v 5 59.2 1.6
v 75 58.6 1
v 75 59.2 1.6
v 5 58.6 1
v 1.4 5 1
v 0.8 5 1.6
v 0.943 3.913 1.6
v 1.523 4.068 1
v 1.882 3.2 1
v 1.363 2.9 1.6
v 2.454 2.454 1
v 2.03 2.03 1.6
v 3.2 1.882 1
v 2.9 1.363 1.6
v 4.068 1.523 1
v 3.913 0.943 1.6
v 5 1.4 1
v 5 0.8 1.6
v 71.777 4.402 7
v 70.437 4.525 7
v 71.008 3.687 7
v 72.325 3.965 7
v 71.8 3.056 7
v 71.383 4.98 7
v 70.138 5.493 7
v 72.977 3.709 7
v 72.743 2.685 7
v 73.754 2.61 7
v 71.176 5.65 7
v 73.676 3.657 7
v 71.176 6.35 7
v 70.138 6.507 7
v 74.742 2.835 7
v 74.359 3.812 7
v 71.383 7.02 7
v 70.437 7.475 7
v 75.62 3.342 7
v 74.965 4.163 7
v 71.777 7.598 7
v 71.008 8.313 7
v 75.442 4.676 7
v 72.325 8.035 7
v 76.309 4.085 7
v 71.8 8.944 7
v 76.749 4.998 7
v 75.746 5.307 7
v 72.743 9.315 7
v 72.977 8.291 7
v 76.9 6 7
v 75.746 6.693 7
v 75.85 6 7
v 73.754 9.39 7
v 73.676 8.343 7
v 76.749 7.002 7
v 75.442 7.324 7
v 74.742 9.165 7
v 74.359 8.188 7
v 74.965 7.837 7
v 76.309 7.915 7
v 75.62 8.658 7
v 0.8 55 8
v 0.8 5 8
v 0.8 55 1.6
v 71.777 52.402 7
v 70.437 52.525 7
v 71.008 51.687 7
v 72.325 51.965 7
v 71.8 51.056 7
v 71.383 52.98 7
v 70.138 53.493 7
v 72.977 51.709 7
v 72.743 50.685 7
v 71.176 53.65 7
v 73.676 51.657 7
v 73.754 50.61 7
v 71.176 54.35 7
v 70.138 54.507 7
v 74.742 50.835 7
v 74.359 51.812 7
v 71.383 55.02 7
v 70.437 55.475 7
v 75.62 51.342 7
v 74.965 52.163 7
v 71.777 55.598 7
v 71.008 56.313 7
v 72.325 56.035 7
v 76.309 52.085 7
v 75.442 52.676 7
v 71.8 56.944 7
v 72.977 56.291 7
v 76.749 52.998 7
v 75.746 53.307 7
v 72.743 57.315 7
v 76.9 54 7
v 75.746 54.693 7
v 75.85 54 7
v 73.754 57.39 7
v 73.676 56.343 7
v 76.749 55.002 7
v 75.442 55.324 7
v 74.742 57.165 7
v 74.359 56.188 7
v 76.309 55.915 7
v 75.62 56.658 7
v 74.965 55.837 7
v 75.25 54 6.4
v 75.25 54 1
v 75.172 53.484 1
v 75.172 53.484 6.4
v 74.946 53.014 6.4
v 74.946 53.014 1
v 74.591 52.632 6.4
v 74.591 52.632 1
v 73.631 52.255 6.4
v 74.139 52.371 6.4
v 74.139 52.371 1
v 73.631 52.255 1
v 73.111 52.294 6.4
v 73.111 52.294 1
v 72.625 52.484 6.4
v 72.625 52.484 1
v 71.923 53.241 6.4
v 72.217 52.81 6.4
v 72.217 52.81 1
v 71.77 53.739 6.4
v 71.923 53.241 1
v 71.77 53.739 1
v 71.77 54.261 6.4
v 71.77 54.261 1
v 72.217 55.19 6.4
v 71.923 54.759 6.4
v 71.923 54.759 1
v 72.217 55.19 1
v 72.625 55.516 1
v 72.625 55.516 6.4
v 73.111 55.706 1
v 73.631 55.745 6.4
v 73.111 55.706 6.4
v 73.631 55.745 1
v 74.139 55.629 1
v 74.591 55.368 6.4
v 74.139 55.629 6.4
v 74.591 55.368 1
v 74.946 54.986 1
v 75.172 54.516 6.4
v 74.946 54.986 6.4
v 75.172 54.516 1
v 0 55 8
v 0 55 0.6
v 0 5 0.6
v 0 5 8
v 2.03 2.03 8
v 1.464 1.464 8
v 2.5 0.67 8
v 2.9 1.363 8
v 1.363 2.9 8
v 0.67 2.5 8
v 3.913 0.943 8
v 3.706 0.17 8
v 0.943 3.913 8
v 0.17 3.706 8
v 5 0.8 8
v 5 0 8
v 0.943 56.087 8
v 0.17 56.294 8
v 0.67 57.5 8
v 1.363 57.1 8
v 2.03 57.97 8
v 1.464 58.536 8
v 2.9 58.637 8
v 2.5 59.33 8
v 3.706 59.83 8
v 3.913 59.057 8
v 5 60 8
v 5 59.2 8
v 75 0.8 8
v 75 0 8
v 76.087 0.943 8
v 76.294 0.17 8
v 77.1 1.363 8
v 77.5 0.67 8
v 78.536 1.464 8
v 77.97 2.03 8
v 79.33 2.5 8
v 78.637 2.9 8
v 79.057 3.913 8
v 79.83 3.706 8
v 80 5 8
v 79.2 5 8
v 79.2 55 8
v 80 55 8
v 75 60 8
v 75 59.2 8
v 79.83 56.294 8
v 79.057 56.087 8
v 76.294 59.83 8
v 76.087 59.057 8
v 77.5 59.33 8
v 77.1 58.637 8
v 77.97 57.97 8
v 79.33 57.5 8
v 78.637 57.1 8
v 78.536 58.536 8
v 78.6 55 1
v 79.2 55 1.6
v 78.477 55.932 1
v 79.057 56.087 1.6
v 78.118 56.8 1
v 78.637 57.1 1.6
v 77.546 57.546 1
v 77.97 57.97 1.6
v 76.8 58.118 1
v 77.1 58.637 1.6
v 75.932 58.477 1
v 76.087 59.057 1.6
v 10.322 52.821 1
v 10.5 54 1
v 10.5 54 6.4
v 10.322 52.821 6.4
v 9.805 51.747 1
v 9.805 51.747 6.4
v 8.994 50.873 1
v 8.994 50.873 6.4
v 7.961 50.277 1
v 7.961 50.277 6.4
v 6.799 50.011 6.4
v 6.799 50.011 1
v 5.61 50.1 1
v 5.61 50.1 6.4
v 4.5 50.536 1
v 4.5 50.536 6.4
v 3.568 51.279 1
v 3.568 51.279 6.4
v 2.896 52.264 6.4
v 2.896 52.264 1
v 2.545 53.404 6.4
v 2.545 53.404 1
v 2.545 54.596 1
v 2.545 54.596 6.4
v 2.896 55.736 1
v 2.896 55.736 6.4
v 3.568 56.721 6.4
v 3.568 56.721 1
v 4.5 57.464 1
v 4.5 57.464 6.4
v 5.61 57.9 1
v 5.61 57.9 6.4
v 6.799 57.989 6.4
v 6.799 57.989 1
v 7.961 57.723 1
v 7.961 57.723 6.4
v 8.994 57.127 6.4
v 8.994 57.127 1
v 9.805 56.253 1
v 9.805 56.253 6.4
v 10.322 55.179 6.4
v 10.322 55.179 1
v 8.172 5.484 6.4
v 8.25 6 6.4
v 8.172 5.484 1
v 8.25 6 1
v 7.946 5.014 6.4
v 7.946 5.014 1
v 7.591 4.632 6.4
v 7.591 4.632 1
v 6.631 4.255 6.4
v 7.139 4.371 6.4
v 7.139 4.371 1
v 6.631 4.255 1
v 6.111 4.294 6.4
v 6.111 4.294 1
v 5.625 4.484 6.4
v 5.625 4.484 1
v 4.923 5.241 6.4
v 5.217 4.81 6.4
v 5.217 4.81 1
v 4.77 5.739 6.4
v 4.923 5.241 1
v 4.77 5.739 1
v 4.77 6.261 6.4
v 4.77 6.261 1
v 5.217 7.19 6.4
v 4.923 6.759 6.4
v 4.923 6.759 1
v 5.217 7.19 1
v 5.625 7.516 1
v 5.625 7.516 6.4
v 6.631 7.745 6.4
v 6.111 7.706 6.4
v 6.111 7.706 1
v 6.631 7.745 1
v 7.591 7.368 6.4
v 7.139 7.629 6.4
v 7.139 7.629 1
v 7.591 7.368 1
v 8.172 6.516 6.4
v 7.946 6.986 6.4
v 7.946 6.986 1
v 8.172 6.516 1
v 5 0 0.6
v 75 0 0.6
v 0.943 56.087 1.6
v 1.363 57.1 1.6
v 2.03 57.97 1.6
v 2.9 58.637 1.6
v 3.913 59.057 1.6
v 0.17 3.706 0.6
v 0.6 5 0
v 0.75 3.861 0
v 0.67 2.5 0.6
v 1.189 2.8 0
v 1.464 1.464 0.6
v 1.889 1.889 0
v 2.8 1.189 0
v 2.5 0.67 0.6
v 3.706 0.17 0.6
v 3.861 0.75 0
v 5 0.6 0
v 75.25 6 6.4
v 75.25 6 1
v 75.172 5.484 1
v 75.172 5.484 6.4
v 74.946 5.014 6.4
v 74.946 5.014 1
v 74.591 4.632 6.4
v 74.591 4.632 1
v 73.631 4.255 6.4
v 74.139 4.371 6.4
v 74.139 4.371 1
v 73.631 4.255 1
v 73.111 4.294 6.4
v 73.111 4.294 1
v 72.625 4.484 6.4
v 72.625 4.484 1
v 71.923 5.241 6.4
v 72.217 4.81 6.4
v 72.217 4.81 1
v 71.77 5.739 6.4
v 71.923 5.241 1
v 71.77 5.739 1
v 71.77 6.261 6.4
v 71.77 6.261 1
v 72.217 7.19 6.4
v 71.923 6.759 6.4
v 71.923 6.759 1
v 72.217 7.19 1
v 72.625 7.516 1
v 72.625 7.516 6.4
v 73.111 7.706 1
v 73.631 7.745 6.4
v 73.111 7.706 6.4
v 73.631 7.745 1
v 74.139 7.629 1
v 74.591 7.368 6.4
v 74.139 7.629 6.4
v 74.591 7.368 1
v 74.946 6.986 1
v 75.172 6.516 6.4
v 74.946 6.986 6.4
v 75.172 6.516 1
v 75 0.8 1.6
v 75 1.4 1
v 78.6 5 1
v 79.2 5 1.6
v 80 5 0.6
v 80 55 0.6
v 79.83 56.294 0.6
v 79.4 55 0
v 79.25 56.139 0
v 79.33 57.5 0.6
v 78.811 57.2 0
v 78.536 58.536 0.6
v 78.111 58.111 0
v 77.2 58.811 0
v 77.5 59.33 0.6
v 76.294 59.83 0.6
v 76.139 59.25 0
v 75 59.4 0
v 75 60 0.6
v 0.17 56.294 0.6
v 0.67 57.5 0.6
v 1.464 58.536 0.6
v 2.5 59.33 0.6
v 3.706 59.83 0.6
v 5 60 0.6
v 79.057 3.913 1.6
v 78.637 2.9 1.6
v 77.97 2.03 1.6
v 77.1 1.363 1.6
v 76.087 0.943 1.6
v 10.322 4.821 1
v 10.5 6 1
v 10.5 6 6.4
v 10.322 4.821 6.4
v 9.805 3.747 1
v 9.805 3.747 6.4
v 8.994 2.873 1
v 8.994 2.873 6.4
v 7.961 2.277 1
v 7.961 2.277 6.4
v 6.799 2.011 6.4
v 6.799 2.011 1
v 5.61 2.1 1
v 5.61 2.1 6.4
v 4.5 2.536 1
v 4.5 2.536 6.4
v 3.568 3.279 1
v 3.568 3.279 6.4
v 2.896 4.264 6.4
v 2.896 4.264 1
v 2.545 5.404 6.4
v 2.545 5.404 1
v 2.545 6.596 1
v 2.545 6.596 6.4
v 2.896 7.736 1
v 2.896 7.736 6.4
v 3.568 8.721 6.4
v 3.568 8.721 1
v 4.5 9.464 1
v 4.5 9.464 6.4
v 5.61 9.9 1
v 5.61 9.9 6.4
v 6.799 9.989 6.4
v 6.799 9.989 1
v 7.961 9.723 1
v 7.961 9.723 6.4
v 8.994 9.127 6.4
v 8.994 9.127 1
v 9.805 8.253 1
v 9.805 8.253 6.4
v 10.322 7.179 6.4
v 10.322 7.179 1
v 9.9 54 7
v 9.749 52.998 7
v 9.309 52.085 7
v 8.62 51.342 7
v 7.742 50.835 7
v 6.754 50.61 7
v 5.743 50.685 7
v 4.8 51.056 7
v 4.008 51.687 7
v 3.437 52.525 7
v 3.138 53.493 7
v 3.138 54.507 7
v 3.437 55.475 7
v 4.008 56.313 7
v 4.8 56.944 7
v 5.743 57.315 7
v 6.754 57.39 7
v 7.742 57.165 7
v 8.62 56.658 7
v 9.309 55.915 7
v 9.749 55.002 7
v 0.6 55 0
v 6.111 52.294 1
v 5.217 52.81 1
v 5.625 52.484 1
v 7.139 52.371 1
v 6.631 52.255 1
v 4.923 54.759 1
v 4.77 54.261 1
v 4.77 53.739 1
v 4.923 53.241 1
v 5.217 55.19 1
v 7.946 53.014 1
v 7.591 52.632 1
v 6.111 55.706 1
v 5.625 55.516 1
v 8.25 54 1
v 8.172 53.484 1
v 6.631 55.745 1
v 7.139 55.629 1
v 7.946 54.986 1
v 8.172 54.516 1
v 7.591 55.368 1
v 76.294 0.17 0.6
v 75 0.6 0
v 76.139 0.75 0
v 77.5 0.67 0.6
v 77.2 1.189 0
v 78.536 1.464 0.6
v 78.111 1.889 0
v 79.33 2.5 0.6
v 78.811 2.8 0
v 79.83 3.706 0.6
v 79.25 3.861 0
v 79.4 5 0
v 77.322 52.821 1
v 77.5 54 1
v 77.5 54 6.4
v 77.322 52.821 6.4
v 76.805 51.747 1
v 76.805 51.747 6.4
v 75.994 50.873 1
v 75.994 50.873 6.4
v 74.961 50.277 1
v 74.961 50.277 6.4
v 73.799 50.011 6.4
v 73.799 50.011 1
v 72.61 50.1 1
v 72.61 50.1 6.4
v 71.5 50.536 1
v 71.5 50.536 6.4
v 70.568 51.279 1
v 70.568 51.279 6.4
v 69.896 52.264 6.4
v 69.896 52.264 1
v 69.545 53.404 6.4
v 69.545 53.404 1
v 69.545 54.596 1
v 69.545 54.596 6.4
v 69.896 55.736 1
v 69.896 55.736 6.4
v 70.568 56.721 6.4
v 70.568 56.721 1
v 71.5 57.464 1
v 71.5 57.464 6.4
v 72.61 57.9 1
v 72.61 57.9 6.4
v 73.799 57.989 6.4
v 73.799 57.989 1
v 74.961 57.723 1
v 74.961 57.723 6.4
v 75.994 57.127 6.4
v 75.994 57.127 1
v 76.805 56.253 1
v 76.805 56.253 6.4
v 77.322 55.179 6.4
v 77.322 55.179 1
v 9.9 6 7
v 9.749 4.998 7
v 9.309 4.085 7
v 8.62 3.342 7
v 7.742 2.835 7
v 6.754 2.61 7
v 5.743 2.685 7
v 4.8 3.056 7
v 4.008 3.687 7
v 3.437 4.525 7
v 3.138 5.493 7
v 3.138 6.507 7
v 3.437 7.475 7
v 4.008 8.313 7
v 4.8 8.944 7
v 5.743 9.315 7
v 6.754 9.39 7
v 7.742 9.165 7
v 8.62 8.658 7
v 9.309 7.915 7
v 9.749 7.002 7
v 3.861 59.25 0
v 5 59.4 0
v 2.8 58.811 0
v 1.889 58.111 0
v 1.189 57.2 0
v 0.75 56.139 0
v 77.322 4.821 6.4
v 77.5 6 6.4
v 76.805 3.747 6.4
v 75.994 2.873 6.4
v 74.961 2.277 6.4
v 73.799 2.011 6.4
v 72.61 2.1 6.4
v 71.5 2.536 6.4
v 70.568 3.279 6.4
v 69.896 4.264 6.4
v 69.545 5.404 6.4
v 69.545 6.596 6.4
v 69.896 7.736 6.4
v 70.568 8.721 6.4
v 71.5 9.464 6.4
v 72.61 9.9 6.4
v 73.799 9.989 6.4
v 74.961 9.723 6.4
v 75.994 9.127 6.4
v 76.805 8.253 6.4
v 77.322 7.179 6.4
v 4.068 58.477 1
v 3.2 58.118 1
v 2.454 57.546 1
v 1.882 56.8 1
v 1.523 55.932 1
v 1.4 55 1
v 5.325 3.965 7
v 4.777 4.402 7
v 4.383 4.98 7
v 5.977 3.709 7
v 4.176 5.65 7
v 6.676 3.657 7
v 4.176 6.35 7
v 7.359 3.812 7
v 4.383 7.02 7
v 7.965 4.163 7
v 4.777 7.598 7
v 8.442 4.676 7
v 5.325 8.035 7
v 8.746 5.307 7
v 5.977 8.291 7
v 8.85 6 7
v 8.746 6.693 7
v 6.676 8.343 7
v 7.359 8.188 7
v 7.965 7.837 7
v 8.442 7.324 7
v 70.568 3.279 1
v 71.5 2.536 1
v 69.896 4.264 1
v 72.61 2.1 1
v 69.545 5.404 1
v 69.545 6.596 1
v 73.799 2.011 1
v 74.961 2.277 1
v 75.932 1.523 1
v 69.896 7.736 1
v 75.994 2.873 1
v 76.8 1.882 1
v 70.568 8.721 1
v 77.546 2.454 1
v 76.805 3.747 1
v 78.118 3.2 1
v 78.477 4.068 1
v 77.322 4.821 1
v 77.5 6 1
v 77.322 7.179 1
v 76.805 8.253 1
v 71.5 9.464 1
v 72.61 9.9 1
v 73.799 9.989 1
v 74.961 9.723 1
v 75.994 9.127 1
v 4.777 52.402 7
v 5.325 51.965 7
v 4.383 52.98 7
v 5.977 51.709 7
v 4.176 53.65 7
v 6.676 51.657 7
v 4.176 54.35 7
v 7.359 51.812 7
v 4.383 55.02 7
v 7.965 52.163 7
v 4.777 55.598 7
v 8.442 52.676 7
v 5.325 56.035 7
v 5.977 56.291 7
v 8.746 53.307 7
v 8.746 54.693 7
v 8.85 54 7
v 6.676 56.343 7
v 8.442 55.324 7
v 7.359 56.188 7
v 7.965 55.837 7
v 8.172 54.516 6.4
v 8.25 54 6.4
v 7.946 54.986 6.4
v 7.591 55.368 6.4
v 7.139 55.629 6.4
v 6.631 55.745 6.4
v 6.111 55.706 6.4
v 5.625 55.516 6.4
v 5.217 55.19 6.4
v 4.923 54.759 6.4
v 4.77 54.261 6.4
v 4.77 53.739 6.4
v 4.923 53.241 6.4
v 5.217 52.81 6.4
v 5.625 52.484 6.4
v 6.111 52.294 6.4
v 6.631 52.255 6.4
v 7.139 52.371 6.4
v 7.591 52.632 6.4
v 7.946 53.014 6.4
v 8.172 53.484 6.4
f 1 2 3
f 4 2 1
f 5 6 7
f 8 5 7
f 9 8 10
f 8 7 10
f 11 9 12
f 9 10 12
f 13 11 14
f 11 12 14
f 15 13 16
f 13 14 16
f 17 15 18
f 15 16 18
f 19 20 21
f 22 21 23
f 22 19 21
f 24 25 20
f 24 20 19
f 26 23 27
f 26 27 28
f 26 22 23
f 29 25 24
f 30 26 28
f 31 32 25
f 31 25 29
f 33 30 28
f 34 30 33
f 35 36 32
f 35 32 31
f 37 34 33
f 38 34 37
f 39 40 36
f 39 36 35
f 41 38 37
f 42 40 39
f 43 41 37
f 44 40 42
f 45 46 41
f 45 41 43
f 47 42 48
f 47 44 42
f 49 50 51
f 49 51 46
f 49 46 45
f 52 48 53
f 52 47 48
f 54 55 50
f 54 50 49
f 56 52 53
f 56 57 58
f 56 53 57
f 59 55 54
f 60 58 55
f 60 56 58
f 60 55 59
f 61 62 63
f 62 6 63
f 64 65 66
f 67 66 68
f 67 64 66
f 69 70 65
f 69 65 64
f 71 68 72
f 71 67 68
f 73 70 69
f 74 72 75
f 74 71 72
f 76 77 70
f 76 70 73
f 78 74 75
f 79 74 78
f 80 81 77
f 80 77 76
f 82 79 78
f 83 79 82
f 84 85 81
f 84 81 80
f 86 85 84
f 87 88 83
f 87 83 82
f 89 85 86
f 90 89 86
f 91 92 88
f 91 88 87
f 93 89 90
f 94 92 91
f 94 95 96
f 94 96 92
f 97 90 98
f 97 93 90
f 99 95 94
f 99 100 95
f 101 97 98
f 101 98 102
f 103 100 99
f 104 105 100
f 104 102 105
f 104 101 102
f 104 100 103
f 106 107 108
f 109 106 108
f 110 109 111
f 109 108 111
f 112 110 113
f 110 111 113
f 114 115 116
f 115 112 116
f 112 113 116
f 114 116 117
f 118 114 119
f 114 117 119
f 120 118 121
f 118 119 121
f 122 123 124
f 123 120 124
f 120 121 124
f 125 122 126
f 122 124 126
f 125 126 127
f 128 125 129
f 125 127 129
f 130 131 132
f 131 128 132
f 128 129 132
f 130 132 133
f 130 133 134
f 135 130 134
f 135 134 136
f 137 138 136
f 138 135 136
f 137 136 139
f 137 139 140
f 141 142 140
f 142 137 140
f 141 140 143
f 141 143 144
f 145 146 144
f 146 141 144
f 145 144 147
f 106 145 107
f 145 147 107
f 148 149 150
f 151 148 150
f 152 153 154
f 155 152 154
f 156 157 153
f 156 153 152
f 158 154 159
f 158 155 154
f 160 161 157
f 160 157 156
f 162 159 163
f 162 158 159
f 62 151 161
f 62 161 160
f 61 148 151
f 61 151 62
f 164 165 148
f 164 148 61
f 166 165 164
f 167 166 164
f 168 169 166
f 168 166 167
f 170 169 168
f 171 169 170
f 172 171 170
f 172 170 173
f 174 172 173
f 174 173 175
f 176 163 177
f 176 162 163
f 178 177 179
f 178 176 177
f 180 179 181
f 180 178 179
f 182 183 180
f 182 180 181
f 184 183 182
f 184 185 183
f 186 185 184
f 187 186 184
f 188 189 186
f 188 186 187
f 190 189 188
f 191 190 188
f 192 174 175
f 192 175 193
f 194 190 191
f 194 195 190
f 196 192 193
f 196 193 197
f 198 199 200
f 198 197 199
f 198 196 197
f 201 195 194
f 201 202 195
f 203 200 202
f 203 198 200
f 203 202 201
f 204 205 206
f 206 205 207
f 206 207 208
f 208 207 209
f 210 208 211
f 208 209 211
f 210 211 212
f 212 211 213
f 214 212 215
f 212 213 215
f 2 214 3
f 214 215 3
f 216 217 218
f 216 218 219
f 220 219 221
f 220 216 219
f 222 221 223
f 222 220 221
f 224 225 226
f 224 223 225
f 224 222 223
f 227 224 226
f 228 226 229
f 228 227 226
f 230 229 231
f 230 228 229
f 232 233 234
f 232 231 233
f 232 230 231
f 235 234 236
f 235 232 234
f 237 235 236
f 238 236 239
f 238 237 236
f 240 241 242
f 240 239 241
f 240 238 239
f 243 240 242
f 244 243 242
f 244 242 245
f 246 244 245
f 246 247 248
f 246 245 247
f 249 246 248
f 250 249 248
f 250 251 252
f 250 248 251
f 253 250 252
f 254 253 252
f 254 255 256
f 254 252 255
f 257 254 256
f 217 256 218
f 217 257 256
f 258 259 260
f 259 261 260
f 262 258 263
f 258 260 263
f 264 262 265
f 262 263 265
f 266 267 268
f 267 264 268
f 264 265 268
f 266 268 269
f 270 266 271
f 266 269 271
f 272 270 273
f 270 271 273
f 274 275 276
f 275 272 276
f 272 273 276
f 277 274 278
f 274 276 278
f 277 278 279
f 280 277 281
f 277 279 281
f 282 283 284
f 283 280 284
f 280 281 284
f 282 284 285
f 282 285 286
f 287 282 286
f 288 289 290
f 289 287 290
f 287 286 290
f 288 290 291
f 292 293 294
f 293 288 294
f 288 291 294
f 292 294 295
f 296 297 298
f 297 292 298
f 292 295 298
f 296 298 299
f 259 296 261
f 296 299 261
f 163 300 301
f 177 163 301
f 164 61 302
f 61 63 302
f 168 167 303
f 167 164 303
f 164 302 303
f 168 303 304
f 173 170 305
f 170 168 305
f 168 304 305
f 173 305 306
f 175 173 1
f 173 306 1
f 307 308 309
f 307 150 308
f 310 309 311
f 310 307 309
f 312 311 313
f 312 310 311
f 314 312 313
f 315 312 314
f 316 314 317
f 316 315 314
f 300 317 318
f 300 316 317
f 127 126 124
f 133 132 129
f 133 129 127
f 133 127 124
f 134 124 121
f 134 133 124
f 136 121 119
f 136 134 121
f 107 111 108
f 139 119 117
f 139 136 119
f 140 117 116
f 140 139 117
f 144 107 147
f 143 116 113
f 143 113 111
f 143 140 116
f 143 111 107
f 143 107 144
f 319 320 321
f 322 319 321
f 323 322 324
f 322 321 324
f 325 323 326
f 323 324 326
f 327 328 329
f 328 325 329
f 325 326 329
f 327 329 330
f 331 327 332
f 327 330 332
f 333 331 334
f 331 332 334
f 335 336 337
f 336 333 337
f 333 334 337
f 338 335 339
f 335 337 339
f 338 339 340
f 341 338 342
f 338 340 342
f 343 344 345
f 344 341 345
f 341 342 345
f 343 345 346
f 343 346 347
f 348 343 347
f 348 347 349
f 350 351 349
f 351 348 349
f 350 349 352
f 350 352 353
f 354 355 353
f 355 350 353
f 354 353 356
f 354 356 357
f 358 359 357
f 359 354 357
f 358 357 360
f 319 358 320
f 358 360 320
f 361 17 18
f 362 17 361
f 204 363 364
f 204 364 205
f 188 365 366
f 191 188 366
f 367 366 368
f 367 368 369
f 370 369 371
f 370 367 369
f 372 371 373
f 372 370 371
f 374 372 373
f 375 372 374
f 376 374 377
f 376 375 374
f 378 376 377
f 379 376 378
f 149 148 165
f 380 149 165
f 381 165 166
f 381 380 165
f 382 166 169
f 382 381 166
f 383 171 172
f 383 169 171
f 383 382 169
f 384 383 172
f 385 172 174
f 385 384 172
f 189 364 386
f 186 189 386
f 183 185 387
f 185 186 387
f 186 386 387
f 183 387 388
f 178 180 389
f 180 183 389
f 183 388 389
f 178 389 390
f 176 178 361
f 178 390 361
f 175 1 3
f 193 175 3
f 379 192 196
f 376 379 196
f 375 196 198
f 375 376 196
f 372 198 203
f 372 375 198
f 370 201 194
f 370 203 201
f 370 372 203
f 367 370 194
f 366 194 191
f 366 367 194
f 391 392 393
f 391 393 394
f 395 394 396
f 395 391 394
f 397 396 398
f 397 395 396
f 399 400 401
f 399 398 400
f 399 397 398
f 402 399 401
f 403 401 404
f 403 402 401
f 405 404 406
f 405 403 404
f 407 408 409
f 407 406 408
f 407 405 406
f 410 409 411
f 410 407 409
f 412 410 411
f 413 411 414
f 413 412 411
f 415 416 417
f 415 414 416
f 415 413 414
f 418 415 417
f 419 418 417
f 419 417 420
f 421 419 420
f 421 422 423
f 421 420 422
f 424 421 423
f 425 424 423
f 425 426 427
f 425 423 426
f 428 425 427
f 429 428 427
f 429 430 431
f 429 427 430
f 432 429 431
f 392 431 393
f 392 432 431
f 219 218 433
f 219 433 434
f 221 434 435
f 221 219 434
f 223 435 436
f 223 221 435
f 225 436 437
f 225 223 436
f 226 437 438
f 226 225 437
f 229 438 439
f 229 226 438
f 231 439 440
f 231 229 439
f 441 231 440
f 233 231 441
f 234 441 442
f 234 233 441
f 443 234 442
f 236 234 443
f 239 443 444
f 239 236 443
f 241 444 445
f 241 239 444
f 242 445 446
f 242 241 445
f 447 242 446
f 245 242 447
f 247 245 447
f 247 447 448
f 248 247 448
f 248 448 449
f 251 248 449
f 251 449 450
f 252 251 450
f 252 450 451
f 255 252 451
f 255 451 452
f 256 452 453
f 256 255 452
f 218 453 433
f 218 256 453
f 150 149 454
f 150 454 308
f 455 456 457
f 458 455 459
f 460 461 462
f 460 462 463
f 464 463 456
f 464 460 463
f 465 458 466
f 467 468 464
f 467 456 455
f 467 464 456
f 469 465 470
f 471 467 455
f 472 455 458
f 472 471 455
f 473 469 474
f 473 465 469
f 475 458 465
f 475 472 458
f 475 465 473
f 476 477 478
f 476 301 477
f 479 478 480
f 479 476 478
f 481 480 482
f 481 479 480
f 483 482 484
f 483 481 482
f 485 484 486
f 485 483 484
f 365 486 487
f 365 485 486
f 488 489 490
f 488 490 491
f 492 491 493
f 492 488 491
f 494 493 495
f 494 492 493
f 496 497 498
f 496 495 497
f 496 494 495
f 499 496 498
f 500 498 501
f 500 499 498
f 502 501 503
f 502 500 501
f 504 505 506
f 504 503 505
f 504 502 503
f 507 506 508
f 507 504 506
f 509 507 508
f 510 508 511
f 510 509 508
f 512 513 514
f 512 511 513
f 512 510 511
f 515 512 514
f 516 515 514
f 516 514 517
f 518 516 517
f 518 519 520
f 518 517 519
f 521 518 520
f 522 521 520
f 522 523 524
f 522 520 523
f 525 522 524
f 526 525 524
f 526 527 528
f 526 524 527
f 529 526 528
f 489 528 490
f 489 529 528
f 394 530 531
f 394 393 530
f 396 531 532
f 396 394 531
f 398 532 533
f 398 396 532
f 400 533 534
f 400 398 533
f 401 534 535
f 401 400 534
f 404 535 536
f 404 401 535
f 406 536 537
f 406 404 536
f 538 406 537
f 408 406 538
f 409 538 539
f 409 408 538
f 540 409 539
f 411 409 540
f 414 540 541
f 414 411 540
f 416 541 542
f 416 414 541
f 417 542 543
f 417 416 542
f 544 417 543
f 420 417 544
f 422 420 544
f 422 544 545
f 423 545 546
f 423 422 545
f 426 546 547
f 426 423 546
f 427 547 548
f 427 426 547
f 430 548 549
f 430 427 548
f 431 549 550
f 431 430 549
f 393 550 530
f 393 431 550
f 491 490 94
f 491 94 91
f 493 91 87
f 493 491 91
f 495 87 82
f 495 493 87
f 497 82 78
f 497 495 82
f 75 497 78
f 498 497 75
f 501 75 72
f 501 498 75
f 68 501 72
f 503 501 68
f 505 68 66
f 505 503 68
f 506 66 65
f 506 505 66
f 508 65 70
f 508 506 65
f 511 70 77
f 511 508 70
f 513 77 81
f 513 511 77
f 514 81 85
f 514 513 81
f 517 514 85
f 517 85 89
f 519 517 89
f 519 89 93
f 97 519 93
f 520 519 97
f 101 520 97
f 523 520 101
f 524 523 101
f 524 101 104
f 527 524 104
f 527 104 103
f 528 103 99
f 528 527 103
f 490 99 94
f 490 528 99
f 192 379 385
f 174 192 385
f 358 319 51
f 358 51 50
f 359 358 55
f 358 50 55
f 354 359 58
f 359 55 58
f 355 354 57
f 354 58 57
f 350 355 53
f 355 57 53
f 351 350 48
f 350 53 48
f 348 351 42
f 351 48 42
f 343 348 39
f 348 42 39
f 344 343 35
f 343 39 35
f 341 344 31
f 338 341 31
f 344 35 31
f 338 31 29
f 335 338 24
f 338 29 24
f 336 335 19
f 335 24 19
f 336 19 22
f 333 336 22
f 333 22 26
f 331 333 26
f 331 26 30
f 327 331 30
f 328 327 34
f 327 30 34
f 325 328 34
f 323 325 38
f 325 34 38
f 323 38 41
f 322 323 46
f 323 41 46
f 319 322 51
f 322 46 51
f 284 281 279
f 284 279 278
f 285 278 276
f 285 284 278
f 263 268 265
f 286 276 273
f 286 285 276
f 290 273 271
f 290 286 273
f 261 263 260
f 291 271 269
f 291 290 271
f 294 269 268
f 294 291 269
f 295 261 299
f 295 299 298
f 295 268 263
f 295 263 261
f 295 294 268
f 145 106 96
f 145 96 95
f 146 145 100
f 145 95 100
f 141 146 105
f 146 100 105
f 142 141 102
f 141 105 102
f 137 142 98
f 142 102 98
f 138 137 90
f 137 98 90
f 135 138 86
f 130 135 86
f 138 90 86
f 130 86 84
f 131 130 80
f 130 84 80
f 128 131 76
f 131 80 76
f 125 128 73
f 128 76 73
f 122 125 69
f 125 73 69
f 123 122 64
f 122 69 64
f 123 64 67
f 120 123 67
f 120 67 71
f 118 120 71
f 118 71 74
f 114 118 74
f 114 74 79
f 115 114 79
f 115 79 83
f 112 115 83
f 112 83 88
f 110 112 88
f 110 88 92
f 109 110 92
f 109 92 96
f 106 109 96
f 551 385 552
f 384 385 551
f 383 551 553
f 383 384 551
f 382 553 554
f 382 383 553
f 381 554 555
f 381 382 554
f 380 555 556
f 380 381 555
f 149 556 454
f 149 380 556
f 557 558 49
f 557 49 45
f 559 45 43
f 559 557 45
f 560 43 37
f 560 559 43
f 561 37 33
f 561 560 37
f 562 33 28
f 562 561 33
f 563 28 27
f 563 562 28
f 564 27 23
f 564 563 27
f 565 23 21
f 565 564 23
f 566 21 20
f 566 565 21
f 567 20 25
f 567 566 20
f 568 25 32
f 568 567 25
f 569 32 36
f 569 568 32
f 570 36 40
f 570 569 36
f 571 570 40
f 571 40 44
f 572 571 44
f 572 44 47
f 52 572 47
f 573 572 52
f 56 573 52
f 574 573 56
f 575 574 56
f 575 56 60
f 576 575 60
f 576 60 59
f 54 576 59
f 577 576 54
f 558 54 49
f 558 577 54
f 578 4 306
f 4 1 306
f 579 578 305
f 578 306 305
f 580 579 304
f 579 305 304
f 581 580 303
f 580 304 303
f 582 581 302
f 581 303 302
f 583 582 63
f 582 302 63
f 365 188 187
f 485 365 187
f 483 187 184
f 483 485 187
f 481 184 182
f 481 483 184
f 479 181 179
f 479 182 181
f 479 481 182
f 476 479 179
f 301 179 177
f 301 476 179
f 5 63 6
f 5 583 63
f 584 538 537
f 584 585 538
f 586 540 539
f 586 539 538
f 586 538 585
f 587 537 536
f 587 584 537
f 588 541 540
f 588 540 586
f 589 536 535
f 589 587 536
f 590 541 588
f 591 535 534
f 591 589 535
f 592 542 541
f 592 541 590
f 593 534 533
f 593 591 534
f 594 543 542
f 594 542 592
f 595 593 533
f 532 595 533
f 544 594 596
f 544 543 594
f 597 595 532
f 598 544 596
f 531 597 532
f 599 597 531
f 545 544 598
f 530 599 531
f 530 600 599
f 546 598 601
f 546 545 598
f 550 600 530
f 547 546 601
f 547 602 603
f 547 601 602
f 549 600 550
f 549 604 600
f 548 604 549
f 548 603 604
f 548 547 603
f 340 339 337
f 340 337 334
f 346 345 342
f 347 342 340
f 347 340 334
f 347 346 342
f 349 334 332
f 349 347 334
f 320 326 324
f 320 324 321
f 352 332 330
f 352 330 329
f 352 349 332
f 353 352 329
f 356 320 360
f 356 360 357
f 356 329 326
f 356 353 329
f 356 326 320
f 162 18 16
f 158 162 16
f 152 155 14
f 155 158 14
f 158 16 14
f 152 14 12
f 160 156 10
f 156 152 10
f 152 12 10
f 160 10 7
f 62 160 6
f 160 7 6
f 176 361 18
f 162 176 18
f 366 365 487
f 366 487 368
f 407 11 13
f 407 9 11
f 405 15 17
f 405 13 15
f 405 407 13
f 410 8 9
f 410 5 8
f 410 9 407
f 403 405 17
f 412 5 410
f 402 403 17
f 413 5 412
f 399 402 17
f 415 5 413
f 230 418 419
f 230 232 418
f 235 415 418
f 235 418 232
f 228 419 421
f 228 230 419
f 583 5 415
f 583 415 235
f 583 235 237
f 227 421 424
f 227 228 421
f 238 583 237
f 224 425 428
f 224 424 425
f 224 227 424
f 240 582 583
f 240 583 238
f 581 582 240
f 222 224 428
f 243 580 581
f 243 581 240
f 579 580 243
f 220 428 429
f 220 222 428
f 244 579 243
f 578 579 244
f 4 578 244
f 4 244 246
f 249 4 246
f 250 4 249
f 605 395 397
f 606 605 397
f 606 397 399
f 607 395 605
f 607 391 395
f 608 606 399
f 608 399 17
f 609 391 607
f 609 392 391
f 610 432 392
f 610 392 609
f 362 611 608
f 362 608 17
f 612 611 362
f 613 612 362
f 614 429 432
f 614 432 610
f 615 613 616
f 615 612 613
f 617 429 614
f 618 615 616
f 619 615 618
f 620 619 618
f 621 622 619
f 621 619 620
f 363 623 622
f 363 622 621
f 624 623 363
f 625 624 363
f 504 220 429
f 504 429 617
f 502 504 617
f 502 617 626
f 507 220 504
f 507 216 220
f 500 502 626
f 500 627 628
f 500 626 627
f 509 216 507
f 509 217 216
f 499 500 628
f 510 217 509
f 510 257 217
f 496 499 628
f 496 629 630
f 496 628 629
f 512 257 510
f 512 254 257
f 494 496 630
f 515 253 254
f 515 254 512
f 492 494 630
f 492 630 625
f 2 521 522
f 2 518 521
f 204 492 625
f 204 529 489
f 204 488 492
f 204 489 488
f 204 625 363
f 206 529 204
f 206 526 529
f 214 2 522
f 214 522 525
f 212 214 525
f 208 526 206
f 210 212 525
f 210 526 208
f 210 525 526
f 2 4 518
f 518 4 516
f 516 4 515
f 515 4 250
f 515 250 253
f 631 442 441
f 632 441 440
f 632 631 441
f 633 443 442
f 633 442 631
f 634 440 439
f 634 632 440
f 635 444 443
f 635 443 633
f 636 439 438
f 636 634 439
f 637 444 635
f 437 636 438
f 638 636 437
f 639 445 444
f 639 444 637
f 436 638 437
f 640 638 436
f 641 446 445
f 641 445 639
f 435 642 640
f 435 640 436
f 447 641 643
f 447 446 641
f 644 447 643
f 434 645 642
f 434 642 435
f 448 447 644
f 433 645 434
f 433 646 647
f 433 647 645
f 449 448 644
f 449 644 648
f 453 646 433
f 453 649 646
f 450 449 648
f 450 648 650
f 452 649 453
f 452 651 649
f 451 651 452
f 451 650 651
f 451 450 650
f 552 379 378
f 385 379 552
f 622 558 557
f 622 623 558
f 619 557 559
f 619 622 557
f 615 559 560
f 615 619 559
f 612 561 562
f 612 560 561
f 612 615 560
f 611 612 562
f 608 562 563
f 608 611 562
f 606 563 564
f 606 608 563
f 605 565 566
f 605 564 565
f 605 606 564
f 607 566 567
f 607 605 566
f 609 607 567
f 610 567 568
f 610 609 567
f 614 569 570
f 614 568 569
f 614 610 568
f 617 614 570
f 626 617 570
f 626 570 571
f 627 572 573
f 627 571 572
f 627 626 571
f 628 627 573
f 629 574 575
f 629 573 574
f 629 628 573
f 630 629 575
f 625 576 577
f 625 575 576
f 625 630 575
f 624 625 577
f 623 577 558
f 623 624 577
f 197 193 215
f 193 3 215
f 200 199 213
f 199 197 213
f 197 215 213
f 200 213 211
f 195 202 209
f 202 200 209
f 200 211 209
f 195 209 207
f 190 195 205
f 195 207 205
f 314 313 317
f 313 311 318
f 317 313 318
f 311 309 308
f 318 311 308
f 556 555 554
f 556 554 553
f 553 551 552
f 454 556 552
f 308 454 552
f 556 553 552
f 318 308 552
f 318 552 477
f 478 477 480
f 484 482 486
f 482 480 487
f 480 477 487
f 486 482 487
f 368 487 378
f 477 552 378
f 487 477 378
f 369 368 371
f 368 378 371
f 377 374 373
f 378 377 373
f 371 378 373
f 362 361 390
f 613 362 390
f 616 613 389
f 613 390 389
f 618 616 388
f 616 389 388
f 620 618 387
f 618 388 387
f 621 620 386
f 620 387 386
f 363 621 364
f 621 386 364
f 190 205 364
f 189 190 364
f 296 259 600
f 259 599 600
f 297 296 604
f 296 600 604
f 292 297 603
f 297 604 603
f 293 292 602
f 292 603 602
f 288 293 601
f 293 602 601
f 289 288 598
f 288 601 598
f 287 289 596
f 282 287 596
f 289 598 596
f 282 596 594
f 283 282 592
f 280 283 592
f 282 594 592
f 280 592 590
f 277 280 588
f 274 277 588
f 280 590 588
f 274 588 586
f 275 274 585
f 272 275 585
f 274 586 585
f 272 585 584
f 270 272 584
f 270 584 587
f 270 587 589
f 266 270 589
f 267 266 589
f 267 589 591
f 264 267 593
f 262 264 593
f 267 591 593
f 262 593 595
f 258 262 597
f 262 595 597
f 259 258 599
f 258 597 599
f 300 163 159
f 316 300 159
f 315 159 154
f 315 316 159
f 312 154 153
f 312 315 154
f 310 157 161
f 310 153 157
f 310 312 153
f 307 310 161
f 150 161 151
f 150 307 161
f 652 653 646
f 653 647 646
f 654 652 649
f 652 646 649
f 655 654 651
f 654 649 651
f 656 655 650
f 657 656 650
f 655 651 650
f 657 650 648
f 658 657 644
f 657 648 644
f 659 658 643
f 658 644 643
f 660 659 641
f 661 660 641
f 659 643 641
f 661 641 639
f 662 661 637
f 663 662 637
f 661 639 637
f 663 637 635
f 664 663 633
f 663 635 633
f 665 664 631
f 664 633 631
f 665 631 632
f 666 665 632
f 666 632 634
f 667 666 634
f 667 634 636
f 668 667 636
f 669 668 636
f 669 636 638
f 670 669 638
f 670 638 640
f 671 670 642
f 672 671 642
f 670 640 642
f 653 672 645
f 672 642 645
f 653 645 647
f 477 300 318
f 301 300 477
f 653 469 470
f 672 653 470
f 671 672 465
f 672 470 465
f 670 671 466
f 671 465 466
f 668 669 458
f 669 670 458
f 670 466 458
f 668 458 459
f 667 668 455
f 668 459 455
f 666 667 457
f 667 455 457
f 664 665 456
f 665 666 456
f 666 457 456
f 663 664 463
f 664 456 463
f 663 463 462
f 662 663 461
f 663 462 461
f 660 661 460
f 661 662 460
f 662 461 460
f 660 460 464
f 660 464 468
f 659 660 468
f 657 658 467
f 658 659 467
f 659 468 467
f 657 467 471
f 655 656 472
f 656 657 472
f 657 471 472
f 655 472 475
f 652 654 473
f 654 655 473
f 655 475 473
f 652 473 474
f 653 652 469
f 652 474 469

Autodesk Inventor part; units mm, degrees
ref_plane "YZ Plane" through (0, 0, 0) normal (1, 0, 0) x (0, 1, 0)
ref_plane "XZ Plane" through (0, 0, 0) normal (0, 1, 0) x (-1, 0, 0)
ref_plane "XY Plane" through (0, 0, 0) normal (0, 0, 1) x (1, 0, 0)
sketch "Эскиз1" plane through (0, 0, 0) normal (0, 0, 1) x (1, 0, 0)
  line L0 (5, 0) -> (75, 0)
  line L1 (80, 5) -> (80, 55)
  line L2 (75, 60) -> (5, 60)
  line L3 (0, 55) -> (0, 5)
  arc A0 (5, 60) -> (0, 55) centre (5, 55) ccw
  arc A1 (80, 55) -> (75, 60) centre (75, 55) ccw
  arc A2 (0, 5) -> (5, 0) centre (5, 5) ccw
  arc A3 (75, 0) -> (80, 5) centre (75, 5) ccw
  point P0 (0, 0)
  point P1 (80, 60)
  point P2 (80, 0)
  point P3 (0, 60)
  dimension "d0" = 60
  dimension "d1" = 80
  dimension "d14" = 5
extrude "Выдавливание1" add sketch "Эскиз1" along normal blind 1
sketch "Эскиз2" plane through (0, 0, 1) normal (0, 0, 1) x (1, 0, 0)
  line L0 (80, 5) -> (80, 55) projected
  line L1 (75, 60) -> (5, 60) projected
  line L2 (0, 55) -> (0, 5) projected
  line L3 (5, 0) -> (75, 0) projected
  line L4 (0, 60) -> (0, 0) projected
  line L5 (0, 54) -> (80, 54) construction
  line L6 (80, 0) -> (80, 60) projected
  line L7 (0, 6) -> (80, 6) construction
  line L8 (6.5, 60) -> (6.5, 0) construction
  line L9 (0, 0) -> (80, 0) projected
  line L10 (80, 60) -> (0, 60) projected
  line L11 (73.5, 60) -> (73.5, 0) construction
  line L12 (0, 0) -> (80, 0) projected
  circle A0 centre (6.5, 54) radius 4
  circle A1 centre (73.5, 54) radius 4
  circle A2 centre (6.5, 6) radius 4
  circle A3 centre (73.5, 6) radius 4
  circle A4 centre (6.5, 54) radius 1.75
  circle A5 centre (73.5, 54) radius 1.75
  circle A6 centre (6.5, 6) radius 1.75
  circle A7 centre (73.5, 6) radius 1.75
  arc A8 (0, 5) -> (5, 0) centre (5, 5) ccw projected
  arc A9 (75, 0) -> (80, 5) centre (75, 5) ccw projected
  arc A10 (80, 55) -> (75, 60) centre (75, 55) ccw projected
  arc A11 (5, 60) -> (0, 55) centre (5, 55) ccw projected
  dimension "d4" = 48
  dimension "d5" = 67
  dimension "d6" = 6
  dimension "d7" = 6.5
  dimension "d8" = 8
  dimension "d10" = 3.5
extrude "Выдавливание2" add sketch "Эскиз2" along normal blind 6 contours A0 | A1 | A2 | A3
sketch "Эскиз3" plane through (0, 0, 1) normal (0, 0, 1) x (1, 0, 0)
  circle A0 centre (6.5, 6) radius 4 projected
  circle A1 centre (73.5, 54) radius 4 projected
  circle A2 centre (73.5, 6) radius 4 projected
  circle A3 centre (6.5, 54) radius 4 projected
  line L0 (0, 55) -> (0, 5) projected
  arc A4 (0, 5) -> (5, 0) centre (5, 5) ccw projected
  line L1 (5, 0) -> (75, 0) projected
  arc A5 (75, 0) -> (80, 5) centre (75, 5) ccw projected
  line L2 (80, 5) -> (80, 55) projected
  arc A6 (80, 55) -> (75, 60) centre (75, 55) ccw projected
  line L3 (75, 60) -> (5, 60) projected
  arc A7 (5, 60) -> (0, 55) centre (5, 55) ccw projected
  line L4 (5, 59.2) -> (75, 59.2)
  arc A8 (79.2, 55) -> (75, 59.2) centre (75, 55) ccw
  line L5 (79.2, 55) -> (79.2, 5)
  arc A9 (75, 0.8) -> (79.2, 5) centre (75, 5) ccw
  line L6 (75, 0.8) -> (5, 0.8)
  arc A10 (0.8, 5) -> (5, 0.8) centre (5, 5) ccw
  line L7 (0.8, 5) -> (0.8, 55)
  arc A11 (5, 59.2) -> (0.8, 55) centre (5, 55) ccw
  line L8 (6.5, 50) -> (0.8, 50)
  circle A12 centre (6.5, 54) radius 4 projected
  line L9 (10.5, 54) -> (10.5, 59.2)
  line L10 (0.8, 10) -> (6.5, 10)
  circle A13 centre (6.5, 6) radius 4 projected
  line L11 (10.5, 0.8) -> (10.5, 6)
  line L12 (69.5, 0.8) -> (69.5, 6)
  circle A14 centre (73.5, 6) radius 4 projected
  circle A15 centre (73.5, 6) radius 4 projected
  line L13 (73.5, 10) -> (79.2, 10)
  circle A16 centre (73.5, 54) radius 4 projected
  line L14 (73.5, 50) -> (79.2, 50)
  line L15 (69.5, 59.2) -> (69.5, 54)
  point P0 (0, 0)
  dimension "d15" = 0.8
extrude "Выдавливание3" add sketch "Эскиз3" along normal blind 7
chamfer "Фаска1" distance 0.6 angle 45 24 edges at (40, 0, 0) (78.5355, 1.4645, 0) (80, 30, 0) (78.5355, 58.5355, 0) (40, 60, 0) (1.4645, 58.5355, 0) (0, 30, 0) (1.4645, 1.4645, 0) (40, 59.2, 1) (2.0302, 57.9698, 1) (0.8, 30, 1) (2.0302, 2.0302, 1) (40, 0.8, 1) (77.9698, 2.0302, 1) (79.2, 30, 1) (77.9698, 57.9698, 1) (4.75, 6, 7) (2.5, 6, 7) (4.75, 54, 7) (2.5, 54, 7) (71.75, 54, 7) (69.5, 54, 7) (71.75, 6, 7) (69.5, 6, 7)
properties part number "Корпус платы"
